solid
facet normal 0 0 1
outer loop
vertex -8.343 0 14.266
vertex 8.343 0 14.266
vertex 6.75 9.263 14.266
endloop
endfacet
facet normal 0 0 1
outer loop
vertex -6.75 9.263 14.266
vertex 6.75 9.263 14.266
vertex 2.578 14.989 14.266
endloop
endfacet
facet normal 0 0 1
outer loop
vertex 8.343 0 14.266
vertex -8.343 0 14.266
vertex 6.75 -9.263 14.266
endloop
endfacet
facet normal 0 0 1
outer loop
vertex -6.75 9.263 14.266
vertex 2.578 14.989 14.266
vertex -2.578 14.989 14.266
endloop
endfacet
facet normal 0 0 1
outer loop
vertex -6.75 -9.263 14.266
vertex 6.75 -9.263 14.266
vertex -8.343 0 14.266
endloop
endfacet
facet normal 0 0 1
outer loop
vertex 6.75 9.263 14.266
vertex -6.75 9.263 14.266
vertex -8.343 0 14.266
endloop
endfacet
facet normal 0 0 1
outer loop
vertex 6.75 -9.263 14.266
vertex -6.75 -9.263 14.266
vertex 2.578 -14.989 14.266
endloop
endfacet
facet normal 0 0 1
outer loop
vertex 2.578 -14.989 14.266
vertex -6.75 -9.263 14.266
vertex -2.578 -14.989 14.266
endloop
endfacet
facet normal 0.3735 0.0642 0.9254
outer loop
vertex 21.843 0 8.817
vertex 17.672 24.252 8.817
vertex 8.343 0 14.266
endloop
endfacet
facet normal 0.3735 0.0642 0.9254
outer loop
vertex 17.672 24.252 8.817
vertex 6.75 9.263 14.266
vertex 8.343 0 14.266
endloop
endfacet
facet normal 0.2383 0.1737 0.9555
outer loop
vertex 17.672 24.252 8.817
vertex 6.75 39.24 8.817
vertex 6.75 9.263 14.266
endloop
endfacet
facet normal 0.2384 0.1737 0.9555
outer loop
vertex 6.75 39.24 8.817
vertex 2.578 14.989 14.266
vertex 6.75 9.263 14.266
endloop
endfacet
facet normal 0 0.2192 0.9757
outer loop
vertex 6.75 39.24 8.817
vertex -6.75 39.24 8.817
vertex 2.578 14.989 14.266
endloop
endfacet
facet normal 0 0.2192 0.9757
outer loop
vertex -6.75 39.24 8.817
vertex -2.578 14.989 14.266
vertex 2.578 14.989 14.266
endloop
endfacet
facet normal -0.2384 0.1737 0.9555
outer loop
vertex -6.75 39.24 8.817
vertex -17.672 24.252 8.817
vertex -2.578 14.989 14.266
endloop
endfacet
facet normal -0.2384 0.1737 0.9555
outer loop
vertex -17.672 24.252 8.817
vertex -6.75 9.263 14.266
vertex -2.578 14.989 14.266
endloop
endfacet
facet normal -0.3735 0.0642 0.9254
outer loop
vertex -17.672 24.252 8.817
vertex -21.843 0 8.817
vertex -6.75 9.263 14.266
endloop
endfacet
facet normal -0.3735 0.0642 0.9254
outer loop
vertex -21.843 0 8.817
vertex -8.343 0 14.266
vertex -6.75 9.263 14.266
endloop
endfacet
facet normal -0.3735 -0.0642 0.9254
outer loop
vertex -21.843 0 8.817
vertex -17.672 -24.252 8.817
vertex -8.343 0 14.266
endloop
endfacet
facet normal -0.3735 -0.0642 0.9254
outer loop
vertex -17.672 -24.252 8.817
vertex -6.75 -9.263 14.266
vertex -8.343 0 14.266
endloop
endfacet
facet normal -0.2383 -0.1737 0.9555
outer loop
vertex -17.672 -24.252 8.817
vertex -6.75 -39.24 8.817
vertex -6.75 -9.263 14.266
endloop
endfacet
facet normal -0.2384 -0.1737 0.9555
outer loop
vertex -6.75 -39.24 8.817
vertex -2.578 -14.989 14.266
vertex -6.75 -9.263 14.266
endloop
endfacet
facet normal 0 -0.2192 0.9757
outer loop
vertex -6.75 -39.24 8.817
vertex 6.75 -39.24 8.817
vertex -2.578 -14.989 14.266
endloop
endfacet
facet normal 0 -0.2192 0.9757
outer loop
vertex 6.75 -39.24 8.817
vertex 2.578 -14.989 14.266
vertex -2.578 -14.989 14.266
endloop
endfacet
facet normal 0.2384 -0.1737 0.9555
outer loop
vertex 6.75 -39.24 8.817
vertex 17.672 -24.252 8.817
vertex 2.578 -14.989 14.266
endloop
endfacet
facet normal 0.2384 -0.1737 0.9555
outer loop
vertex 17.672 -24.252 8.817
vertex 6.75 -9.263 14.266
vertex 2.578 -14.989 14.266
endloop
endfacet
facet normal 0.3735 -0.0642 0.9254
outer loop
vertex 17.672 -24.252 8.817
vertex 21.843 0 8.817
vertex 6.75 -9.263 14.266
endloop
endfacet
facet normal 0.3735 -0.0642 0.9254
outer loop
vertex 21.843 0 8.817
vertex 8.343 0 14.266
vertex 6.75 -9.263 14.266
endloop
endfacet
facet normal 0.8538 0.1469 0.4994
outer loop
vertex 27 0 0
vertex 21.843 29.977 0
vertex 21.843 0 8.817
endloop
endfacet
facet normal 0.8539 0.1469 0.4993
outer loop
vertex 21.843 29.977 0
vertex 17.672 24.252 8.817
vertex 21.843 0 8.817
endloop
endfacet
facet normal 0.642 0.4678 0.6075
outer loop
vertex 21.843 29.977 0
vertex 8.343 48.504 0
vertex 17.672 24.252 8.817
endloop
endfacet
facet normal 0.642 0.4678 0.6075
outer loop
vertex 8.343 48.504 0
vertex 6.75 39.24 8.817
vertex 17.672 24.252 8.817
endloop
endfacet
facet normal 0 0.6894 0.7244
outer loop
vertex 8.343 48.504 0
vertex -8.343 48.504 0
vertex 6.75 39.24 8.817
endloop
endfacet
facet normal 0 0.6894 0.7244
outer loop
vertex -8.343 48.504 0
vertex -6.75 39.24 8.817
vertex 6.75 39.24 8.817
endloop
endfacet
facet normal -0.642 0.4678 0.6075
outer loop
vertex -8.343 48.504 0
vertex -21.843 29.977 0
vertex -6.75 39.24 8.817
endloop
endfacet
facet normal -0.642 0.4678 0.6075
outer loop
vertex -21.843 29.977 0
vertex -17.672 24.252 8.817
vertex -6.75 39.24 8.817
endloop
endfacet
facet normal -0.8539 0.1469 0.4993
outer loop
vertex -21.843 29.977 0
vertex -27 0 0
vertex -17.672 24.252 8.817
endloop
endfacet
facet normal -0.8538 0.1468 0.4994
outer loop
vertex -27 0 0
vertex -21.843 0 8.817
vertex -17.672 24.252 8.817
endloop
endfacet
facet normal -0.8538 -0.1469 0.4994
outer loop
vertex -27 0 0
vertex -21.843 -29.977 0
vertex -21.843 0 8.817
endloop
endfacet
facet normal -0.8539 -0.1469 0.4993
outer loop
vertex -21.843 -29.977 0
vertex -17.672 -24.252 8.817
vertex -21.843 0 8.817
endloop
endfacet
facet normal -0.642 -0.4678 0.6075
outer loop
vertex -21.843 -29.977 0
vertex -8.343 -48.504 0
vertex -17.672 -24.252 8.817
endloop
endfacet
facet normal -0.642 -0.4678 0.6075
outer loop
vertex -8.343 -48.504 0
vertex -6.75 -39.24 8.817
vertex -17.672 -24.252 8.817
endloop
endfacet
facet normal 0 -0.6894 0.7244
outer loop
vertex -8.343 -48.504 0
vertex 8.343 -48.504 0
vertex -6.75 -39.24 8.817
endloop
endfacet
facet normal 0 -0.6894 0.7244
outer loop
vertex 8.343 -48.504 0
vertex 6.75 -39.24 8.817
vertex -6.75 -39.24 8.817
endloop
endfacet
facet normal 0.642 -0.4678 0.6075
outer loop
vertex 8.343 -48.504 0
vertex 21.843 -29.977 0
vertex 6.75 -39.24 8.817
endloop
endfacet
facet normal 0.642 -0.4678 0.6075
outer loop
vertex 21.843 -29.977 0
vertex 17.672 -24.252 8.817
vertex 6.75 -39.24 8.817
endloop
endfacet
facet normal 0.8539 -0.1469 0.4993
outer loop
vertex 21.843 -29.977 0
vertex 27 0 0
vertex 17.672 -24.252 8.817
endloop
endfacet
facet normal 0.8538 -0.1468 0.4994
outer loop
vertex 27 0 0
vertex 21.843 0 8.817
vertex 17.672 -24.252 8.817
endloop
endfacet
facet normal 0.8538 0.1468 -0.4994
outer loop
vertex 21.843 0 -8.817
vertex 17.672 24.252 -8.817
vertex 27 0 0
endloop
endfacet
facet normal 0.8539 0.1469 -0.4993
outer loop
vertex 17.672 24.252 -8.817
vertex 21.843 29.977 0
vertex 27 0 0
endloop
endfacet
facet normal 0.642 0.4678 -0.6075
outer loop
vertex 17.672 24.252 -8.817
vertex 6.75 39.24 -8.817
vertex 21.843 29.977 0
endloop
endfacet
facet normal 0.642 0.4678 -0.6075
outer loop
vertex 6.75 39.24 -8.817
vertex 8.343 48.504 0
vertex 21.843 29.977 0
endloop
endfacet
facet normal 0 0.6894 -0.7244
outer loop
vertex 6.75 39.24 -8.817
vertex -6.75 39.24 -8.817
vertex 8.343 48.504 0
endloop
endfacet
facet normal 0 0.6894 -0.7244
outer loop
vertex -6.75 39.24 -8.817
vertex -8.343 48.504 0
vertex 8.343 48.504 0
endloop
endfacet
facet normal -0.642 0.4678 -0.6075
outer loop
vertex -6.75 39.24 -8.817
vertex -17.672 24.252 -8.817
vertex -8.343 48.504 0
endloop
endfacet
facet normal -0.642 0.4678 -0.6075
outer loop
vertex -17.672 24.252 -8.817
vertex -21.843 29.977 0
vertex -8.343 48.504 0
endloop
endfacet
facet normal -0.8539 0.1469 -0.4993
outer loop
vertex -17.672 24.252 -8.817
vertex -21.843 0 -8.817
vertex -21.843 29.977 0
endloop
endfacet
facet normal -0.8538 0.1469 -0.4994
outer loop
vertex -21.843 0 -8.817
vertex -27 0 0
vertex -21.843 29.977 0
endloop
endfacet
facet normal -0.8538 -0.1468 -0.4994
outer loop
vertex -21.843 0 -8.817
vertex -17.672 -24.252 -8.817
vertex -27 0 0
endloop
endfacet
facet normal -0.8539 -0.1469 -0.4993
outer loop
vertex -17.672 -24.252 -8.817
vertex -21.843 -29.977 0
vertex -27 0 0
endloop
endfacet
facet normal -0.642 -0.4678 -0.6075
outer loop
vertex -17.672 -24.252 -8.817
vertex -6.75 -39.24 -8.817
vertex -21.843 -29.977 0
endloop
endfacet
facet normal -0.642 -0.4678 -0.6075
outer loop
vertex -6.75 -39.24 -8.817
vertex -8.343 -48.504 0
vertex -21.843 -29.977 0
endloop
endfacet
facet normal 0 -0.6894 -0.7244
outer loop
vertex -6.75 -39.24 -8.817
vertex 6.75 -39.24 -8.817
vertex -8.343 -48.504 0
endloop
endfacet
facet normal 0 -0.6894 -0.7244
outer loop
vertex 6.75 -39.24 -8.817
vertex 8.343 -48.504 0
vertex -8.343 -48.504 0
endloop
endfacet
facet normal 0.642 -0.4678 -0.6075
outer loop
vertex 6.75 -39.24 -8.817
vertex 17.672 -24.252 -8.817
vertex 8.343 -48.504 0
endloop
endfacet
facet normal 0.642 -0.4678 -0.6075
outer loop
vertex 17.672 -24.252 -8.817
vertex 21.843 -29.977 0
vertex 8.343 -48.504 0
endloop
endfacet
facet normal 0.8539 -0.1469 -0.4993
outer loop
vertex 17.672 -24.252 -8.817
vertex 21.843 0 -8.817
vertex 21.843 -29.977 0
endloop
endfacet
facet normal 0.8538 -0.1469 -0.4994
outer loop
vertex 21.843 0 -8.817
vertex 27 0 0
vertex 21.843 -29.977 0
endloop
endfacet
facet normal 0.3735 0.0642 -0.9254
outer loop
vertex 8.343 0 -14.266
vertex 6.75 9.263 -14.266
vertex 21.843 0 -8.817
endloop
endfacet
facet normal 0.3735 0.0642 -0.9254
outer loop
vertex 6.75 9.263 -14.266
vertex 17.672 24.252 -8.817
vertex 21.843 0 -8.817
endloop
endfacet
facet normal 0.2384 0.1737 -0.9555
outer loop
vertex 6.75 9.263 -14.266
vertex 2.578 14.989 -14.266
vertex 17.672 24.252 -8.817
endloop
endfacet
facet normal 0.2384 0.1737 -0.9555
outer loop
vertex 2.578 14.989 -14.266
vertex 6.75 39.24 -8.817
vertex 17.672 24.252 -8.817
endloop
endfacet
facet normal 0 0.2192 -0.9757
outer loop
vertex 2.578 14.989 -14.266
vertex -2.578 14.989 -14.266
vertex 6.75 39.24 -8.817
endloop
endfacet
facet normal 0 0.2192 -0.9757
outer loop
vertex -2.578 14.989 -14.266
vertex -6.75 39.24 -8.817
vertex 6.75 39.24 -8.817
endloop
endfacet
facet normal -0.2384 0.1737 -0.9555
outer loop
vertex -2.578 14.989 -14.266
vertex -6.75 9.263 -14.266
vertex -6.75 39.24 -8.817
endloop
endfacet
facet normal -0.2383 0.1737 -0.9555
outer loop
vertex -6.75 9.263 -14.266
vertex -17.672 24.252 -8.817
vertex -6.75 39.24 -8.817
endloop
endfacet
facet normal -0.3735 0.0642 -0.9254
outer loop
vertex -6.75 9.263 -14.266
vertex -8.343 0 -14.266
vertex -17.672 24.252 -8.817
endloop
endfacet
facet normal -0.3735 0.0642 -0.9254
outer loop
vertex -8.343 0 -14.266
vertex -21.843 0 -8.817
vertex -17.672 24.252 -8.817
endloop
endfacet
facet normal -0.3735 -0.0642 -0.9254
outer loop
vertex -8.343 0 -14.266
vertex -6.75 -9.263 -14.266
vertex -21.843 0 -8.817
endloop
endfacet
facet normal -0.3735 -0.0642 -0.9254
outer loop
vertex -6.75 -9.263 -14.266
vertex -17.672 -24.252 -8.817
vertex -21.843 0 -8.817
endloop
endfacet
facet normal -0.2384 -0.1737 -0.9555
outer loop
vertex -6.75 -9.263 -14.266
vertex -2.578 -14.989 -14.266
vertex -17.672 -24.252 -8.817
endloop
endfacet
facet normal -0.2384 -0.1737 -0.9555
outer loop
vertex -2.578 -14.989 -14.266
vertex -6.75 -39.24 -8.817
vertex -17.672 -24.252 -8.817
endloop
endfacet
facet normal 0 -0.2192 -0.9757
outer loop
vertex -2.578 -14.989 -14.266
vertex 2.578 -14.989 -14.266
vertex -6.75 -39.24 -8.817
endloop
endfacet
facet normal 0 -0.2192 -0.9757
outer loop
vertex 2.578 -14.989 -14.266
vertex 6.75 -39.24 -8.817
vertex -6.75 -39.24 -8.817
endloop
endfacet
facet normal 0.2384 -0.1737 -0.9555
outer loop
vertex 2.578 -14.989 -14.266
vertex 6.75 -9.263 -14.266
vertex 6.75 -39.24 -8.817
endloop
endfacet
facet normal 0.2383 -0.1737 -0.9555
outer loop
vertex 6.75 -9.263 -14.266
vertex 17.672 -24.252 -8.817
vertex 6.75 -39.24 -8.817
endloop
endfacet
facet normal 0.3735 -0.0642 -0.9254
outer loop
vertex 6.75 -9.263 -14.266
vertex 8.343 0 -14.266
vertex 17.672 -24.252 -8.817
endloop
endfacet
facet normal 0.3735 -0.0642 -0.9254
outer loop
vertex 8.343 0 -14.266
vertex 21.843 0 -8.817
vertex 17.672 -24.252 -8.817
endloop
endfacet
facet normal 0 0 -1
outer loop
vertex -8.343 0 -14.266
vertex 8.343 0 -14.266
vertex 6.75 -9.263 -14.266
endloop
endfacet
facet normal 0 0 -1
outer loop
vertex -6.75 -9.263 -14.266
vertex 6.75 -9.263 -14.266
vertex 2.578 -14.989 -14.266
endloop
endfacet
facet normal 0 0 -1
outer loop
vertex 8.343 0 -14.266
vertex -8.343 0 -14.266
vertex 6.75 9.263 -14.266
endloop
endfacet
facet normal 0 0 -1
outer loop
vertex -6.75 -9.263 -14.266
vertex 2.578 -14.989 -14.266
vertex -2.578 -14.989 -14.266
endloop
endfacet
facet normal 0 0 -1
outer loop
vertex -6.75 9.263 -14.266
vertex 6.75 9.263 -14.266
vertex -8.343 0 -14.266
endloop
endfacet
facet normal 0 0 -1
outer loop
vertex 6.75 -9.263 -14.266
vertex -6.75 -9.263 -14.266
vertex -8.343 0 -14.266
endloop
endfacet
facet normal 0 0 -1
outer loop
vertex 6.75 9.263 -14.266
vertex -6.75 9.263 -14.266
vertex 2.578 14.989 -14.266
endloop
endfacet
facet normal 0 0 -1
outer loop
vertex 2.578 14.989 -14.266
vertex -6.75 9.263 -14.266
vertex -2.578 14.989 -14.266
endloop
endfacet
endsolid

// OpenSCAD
// Generated by SolidPython 1.0.1 on 2020-07-29 00:46:49


scale(v = [9, 17, 5]) {
	sphere(r = 3);
}
/***********************************************
*********      SolidPython code:      **********
************************************************
 
# import packages: SolidPython
from solid import *
from solid.utils import *
from itertools import chain, combinations, permutations


class Resize:

    def __init__(self, scad_file):
        self.scad_file = scad_file
        #self.scad_file = import_scad(scad_file)
        # cone/cylinder param:
        self.r1 = 0
        self.r2 = 0
        self.h = 0
        # rectangular prism param:
        self.w = 0
        self.l = 0
        # ellipse param:
        self.r = 0

    # import OpenScad code (file name corresponds to shape)


    # classify shape + parameters
    def assign(self, param1, param2, param3):
        if self.scad_file == 'cone.scad':
            self.r1 = param1
            self.r2 = param2
            self.h = param3
        elif self.scad_file == 'cylinder.scad':
            self.r1 = param1
            self.r2 = param2
            self.h = param3
        elif self.scad_file == 'rectangularPrism.scad':
            self.h = param1
            self.l = param2
            self.w = param3
        else:
            self.r = param1
            self.h = param2

    # resize parameters
    def iterate(self):
        x = range(3, 20, 2)
        i = 1
        if self.scad_file == 'cone.scad':
            tempList = list(permutations(x, 2))
            for temp in tempList:
                param1 = temp[0]
                param2 = temp[1]
                filepath = 'produced_scad_files/' + 'cone' + str(param1) + '_' + str(param2) + '_' + '.scad'
                scad_render_to_file(cylinder(h=param1, r1=param2, r2=0), filepath)

        elif self.scad_file == 'cylinder.scad':
            tempList = list(permutations(x, 3))
            for temp in tempList:
                param1 = temp[0]
                param2 = temp[1]
                filepath = 'produced_scad_files/' + 'cylinder' + str(param1) + '_' + str(param2) + '_' + '.scad'
                scad_render_to_file(cylinder(h=param1, r1=param2, r2=param2), filepath)

        elif self.scad_file == 'rectangularPrism.scad':
            tempList = list(permutations(x, 3))
            for temp in tempList:
                param1 = temp[0]
                param2 = temp[1]
                param3 = temp[2]
                filepath = 'produced_scad_files/' + 'rectangularPrism' + str(param1) + '_' + str(param2) + '_' + str(
                    param3) + '.scad'
                scad_render_to_file(cube(size=(param1, param2, param3)), filepath)

        elif self.scad_file == 'ellipse.scad':
            tempList = list(permutations(x, 4))
            for temp in tempList:
                param1 = temp[0]
                param2 = temp[1]
                param3 = temp[2]
                param4 = temp[3]
                filepath = 'produced_scad_files/' + 'ellipse' + str(param1) + '_' + str(param2) + '_' + str(param3) + '_' + str(param4) + '.scad'
                scad_render_to_file(scale([param1, param2, param3])(sphere(r=param4)), filepath)

    def render_to_scadfile(self):
        scad_render_to_file(scad, 'example.scad') 
 
************************************************/
